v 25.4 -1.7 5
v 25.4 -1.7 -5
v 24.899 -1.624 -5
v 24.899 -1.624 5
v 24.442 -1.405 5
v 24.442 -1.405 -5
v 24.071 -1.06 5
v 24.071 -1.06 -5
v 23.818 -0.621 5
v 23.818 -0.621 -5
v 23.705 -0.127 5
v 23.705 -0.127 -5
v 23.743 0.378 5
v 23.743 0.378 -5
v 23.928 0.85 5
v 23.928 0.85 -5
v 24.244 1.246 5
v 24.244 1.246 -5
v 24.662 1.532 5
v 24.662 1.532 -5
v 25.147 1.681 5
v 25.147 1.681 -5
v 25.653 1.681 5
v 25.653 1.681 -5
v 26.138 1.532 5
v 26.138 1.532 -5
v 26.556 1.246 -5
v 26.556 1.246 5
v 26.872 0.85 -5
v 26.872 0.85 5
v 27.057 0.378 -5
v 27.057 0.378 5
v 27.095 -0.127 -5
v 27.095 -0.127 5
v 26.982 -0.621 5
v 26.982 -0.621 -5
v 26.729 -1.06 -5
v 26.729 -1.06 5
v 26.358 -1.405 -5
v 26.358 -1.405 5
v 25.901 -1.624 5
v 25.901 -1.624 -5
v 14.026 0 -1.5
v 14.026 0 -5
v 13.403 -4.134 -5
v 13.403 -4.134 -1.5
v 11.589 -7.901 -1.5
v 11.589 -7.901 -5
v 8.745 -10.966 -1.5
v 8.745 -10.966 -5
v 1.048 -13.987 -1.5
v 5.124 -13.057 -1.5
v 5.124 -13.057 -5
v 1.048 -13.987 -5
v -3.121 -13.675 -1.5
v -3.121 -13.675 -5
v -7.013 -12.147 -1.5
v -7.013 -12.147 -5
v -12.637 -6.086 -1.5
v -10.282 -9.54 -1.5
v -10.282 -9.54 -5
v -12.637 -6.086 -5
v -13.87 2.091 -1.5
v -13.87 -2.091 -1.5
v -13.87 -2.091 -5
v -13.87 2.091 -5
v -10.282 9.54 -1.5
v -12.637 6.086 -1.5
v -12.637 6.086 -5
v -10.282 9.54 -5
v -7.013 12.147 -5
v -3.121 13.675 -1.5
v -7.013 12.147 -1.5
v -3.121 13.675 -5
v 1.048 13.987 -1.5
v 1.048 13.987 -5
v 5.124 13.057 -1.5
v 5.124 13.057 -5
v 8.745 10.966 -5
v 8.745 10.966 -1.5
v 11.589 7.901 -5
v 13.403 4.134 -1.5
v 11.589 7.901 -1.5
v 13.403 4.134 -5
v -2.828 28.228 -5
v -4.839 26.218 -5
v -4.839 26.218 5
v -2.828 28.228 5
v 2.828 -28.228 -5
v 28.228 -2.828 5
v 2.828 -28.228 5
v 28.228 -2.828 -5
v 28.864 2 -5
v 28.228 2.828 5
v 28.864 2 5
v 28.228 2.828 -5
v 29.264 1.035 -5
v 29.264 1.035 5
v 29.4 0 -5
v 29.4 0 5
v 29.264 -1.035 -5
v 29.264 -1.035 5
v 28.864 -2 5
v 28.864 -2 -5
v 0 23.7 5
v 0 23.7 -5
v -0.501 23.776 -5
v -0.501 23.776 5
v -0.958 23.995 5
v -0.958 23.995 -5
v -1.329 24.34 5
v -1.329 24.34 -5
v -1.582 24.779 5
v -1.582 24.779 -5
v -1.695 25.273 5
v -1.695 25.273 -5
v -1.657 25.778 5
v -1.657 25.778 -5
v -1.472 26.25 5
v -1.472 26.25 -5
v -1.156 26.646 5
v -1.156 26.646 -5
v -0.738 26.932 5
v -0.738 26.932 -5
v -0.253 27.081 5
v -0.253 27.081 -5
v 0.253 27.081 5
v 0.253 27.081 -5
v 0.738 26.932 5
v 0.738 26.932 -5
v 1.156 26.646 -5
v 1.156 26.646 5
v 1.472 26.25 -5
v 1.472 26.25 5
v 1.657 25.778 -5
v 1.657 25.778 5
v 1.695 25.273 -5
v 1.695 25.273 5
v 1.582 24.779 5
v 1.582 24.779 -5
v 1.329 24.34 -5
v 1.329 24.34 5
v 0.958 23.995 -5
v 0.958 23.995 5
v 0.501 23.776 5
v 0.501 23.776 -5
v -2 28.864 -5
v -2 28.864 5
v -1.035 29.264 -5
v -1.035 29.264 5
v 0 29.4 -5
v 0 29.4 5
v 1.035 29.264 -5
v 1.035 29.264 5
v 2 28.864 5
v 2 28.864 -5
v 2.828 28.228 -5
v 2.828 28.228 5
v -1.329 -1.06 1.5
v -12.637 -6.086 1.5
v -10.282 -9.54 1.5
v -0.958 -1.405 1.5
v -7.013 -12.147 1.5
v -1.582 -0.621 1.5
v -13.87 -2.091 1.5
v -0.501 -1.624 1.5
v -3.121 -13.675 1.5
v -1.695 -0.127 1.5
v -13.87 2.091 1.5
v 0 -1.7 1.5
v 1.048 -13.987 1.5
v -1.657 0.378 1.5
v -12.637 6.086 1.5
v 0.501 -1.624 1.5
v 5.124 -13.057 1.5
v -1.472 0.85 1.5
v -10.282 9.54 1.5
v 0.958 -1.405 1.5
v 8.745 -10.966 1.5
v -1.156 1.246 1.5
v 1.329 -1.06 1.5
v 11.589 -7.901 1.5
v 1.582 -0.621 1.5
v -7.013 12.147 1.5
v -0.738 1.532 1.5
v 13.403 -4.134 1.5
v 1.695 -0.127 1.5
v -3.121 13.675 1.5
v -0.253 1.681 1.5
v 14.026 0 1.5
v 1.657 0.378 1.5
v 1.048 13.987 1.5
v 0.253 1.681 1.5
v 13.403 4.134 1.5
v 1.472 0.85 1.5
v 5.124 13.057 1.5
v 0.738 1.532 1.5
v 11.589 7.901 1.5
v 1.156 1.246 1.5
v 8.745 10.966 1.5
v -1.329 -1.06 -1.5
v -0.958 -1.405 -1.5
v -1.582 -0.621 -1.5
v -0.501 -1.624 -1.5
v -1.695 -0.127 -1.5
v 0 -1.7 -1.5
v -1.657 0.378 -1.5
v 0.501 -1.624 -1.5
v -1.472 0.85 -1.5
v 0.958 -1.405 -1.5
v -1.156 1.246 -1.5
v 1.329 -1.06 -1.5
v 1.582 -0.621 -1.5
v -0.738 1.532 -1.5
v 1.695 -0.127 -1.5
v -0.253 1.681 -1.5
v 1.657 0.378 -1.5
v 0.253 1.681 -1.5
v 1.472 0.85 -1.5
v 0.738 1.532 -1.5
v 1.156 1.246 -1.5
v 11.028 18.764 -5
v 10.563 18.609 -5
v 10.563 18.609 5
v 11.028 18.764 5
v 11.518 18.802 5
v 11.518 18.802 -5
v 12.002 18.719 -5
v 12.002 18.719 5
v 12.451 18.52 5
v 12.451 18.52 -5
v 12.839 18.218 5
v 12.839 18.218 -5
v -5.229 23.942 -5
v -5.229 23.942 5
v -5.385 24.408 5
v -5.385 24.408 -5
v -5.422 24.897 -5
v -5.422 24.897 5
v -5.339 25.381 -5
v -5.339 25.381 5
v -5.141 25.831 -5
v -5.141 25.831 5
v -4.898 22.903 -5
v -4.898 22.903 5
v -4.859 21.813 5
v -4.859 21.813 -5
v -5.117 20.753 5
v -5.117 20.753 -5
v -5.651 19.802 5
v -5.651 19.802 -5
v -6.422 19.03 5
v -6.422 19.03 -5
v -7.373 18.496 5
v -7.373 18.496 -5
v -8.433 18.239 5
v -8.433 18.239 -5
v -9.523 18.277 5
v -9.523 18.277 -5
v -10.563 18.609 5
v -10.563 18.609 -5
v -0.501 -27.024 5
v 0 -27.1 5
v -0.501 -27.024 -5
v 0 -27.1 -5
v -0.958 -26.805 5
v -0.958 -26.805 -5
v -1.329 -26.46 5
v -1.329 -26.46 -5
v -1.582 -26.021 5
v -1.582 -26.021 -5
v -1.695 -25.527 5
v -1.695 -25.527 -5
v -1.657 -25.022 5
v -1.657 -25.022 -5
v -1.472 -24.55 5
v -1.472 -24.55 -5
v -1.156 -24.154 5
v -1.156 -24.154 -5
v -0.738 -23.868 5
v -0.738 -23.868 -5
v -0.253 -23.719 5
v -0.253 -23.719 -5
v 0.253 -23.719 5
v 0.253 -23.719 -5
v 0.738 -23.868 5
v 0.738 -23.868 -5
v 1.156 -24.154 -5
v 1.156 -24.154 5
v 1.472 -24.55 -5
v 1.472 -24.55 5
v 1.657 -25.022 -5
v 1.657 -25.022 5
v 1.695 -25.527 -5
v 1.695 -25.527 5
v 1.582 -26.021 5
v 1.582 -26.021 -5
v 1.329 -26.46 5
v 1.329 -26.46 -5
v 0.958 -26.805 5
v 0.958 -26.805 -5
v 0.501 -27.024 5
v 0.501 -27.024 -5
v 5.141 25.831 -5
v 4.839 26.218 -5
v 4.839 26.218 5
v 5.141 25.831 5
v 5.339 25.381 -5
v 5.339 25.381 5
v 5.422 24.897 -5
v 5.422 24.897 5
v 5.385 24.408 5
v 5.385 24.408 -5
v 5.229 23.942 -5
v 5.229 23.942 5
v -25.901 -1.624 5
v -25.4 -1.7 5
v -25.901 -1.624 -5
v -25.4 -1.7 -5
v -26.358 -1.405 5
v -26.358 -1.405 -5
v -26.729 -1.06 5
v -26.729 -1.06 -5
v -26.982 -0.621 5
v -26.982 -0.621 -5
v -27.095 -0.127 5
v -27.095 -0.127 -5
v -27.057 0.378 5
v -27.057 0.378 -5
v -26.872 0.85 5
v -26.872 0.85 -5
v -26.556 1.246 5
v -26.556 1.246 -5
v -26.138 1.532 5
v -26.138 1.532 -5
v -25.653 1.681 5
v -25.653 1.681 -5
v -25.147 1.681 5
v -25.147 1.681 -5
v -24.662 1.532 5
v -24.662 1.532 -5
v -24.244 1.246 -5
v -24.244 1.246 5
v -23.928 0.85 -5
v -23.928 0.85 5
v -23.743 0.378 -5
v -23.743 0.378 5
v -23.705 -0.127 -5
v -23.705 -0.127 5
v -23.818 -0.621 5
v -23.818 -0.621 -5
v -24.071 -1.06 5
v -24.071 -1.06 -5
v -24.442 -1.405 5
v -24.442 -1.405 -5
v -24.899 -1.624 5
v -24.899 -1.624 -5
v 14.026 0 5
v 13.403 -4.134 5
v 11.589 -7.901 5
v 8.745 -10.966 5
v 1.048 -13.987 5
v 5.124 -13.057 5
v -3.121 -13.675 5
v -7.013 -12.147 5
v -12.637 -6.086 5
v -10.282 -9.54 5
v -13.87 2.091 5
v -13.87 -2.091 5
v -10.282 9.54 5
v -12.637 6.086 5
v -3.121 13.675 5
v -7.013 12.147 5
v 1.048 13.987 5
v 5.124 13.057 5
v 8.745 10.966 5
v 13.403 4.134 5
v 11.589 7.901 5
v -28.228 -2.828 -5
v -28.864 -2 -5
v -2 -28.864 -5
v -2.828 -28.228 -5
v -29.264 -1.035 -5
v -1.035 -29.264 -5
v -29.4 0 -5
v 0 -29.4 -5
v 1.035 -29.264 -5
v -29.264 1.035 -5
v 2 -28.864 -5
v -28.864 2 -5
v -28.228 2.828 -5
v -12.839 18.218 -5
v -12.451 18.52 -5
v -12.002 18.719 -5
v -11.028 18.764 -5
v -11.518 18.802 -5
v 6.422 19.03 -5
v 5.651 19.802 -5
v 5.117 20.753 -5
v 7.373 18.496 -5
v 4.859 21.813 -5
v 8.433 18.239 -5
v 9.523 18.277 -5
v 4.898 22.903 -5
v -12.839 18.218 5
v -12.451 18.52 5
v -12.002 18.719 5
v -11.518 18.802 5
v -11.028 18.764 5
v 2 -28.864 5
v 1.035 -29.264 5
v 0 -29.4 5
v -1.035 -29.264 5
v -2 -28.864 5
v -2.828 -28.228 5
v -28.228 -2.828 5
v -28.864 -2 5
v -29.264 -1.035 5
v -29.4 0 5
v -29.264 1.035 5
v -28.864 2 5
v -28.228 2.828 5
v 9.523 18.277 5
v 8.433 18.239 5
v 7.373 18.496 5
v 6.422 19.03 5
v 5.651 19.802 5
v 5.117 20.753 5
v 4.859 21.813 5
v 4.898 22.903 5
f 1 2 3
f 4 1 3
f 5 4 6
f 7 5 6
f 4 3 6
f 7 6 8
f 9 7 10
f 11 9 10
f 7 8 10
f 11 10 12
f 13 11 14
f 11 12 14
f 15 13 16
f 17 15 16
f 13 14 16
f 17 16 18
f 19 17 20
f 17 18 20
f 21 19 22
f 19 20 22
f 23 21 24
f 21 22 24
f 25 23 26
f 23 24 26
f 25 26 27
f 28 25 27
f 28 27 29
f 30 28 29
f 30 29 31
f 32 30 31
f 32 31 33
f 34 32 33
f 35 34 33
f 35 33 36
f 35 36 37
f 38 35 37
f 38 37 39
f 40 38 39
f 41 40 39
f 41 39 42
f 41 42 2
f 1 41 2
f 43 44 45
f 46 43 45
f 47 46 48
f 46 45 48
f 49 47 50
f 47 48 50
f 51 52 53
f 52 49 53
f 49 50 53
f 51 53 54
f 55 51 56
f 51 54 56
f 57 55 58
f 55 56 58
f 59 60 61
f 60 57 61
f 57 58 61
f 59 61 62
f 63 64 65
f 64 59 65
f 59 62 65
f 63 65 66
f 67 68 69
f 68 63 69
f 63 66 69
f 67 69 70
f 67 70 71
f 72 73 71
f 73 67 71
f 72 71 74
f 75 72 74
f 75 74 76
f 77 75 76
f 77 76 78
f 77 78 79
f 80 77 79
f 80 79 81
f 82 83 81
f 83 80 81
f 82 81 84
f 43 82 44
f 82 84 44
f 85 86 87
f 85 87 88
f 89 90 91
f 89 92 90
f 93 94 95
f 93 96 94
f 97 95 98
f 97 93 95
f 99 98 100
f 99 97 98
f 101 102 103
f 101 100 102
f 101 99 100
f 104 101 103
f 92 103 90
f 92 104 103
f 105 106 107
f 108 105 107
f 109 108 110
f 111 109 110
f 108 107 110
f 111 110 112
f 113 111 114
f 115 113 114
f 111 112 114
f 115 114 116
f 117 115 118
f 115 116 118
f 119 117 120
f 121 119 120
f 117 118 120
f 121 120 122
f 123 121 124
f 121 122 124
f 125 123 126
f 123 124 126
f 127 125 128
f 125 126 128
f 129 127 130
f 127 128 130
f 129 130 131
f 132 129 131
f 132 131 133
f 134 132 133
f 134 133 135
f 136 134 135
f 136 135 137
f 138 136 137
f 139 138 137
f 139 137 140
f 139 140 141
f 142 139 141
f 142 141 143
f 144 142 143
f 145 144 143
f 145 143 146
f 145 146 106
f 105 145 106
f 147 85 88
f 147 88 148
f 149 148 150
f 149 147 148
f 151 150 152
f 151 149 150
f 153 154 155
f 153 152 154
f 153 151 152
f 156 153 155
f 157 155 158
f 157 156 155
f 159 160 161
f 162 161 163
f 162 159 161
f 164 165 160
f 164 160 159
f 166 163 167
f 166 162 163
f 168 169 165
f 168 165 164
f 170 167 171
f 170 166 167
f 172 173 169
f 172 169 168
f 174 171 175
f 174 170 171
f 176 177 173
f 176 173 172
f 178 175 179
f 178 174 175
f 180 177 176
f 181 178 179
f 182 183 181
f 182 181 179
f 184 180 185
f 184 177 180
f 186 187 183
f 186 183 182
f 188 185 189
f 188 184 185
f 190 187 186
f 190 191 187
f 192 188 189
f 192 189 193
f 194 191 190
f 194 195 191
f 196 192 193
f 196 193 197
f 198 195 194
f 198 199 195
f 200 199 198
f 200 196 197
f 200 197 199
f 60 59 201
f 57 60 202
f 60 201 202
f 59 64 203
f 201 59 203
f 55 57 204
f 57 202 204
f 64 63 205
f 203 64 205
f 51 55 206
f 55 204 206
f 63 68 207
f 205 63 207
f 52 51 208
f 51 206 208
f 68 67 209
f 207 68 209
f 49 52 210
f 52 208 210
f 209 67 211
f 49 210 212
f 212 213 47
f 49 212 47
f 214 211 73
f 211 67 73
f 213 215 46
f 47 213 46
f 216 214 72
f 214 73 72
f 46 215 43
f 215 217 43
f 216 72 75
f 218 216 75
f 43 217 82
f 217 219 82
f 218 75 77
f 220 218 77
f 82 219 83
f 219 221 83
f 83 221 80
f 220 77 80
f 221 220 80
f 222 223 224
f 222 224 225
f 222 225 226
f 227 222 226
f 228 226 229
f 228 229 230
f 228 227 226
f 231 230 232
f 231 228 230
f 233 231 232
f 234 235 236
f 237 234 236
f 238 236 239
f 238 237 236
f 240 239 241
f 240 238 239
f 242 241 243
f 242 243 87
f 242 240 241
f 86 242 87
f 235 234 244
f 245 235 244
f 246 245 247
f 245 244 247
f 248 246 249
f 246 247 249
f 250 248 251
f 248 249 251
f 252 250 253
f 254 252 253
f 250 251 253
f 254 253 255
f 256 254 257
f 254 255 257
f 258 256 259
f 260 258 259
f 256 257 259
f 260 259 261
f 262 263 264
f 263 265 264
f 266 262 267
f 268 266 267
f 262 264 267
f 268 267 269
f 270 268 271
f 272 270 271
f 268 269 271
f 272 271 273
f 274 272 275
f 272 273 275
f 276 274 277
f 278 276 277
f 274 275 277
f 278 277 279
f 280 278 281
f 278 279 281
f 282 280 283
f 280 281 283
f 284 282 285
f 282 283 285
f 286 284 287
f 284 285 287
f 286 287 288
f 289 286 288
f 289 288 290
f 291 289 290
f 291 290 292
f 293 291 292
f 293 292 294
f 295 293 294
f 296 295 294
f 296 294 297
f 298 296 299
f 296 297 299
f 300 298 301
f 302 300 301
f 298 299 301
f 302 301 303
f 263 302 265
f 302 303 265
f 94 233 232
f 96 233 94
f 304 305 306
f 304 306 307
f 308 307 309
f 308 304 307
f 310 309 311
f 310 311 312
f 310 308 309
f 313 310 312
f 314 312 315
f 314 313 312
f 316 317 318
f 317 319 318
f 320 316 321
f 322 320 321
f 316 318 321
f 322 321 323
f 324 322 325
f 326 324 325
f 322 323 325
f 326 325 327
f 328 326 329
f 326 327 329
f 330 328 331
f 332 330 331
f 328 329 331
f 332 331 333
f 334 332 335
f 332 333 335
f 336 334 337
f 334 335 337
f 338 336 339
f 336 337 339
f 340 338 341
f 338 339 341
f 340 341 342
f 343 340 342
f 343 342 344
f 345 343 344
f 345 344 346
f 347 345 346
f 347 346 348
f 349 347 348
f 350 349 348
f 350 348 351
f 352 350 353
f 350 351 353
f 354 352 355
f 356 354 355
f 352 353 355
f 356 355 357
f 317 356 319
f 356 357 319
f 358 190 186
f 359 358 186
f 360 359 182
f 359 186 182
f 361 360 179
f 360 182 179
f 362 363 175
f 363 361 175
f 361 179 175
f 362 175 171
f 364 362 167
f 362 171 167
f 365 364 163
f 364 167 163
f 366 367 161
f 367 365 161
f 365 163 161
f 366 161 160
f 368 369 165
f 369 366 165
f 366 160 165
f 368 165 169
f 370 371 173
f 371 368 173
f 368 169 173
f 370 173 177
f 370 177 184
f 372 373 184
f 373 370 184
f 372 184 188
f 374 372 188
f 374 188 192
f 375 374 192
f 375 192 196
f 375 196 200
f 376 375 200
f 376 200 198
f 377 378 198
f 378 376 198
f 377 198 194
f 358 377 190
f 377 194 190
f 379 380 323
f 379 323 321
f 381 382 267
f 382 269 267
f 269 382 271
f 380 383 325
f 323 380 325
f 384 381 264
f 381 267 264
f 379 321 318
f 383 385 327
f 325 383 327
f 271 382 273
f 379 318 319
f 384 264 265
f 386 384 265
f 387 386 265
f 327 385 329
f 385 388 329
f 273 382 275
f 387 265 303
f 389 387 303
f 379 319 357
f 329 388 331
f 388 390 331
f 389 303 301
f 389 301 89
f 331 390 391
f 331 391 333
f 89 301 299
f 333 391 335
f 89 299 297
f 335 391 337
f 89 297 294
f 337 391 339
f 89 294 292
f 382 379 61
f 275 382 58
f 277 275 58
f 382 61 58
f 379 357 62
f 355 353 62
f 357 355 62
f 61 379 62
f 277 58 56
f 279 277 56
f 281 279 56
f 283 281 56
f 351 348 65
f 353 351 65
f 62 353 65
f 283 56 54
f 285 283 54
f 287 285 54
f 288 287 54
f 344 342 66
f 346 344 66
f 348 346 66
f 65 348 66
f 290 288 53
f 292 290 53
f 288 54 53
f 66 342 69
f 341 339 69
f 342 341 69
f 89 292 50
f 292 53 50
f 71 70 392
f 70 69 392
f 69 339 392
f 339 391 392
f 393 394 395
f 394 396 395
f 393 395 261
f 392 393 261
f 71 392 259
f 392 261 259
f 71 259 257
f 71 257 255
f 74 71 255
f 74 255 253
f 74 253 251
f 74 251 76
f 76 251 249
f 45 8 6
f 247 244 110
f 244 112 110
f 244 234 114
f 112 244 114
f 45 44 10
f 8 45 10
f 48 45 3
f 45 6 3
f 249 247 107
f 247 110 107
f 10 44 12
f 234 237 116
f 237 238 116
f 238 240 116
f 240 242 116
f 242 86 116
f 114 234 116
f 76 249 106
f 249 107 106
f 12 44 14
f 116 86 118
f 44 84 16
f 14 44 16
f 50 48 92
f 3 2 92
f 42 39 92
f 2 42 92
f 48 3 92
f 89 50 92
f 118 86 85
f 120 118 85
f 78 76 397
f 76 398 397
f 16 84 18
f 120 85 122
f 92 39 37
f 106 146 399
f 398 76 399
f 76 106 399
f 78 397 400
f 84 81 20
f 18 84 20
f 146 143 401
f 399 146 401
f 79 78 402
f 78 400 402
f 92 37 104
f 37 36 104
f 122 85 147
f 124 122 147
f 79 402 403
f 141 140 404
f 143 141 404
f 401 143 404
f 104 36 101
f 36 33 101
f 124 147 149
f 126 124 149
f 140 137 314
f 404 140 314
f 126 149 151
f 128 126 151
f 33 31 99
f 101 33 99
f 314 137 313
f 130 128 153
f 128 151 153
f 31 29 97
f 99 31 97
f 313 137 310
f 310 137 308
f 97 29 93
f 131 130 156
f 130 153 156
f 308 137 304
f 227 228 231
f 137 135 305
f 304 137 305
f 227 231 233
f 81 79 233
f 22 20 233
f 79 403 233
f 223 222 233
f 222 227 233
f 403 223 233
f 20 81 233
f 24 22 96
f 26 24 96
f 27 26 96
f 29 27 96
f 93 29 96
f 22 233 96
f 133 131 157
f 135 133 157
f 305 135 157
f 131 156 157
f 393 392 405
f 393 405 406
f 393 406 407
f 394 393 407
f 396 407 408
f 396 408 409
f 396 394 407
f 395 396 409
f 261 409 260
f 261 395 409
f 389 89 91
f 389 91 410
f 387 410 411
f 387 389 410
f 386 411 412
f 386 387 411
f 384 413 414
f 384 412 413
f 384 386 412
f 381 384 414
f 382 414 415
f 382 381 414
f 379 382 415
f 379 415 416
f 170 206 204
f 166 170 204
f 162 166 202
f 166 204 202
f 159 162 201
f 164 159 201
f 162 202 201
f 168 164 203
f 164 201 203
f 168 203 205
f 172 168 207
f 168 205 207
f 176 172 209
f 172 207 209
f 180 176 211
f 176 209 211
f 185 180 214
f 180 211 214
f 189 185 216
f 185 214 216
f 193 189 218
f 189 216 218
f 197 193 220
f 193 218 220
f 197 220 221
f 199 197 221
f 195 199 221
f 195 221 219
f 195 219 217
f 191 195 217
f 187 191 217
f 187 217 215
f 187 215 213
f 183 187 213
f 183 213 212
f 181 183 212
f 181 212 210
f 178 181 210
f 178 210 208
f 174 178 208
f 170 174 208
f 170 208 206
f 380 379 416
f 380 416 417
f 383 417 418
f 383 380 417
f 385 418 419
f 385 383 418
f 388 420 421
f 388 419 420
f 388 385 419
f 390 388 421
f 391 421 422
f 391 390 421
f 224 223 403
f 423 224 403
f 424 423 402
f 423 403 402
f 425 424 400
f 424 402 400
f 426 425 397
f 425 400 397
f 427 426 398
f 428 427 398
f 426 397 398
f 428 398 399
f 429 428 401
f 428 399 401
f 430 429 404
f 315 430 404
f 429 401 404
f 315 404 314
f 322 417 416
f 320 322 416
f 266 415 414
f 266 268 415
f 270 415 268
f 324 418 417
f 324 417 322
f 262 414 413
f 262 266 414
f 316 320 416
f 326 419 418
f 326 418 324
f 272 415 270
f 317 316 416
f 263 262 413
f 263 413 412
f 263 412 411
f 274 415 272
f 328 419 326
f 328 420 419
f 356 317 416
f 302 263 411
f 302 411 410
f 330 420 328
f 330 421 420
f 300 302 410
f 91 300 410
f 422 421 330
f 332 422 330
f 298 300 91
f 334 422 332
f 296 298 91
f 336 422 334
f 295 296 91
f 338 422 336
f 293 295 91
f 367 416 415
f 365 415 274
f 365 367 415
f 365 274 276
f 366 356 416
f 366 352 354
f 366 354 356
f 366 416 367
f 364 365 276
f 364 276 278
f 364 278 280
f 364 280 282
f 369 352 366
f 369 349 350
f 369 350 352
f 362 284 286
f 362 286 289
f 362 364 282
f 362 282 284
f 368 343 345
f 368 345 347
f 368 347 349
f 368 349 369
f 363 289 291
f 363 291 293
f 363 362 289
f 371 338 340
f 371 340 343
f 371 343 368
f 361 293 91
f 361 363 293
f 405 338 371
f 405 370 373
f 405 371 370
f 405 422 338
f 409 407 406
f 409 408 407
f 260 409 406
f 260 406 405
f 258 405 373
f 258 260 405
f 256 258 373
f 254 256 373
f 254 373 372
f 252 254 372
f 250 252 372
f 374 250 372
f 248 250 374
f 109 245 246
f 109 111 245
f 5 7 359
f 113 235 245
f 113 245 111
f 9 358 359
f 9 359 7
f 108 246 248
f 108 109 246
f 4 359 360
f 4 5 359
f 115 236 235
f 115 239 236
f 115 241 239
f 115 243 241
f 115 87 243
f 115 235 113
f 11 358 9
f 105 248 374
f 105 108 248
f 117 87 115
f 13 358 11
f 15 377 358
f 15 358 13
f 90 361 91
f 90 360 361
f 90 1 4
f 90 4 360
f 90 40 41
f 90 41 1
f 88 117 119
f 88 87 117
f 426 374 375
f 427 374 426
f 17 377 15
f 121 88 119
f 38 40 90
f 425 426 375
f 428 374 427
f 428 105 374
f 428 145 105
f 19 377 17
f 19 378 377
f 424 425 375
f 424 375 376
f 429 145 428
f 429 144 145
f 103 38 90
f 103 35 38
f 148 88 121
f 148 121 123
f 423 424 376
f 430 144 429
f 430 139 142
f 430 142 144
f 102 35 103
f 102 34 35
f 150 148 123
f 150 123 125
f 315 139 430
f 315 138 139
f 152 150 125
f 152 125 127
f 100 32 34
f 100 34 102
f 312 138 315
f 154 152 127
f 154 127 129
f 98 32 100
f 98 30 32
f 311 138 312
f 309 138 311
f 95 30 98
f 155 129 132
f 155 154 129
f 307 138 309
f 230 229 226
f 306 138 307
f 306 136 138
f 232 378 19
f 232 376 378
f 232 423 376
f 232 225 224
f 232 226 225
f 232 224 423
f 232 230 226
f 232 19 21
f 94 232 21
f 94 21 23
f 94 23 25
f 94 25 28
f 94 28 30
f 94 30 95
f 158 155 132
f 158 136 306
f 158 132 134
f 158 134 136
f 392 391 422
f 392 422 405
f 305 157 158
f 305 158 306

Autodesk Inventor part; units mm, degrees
ref_plane "YZ Plane" through (0, 0, 0) normal (1, 0, 0) x (0, 1, 0)
ref_plane "XZ Plane" through (0, 0, 0) normal (0, 1, 0) x (-1, 0, 0)
ref_plane "XY Plane" through (0, 0, 0) normal (0, 0, 1) x (1, 0, 0)
sketch "Sketch1" plane through (0, 0, 0) normal (0, 0, 1) x (1, 0, 0)
  line L0 (0, 25.4) -> (-25.4, 0) construction
  line L1 (-25.4, 0) -> (0, -25.4) construction
  line L2 (0, -25.4) -> (25.4, 0) construction
  line L3 (25.4, 0) -> (0, 25.4) construction
  line L4 (0, 25.4) -> (0, -25.4) construction
  line L5 (-25.4, 0) -> (25.4, 0) construction
  line L6 (-28.2284, 2.8284) -> (-2.8284, 28.2284)
  line L7 (2.8284, 28.2284) -> (28.2284, 2.8284)
  line L8 (28.2284, -2.8284) -> (2.8284, -28.2284)
  line L9 (-2.8284, -28.2284) -> (-28.2284, -2.8284)
  arc A0 (2.8284, 28.2284) -> (-2.8284, 28.2284) centre (0, 25.4) ccw
  arc A1 (28.2284, -2.8284) -> (28.2284, 2.8284) centre (25.4, 0) ccw
  arc A2 (-2.8284, -28.2284) -> (2.8284, -28.2284) centre (0, -25.4) ccw
  arc A3 (-28.2284, 2.8284) -> (-28.2284, -2.8284) centre (-25.4, 0) ccw
  circle A4 centre (0, 0) radius 10.0263 construction
  circle A5 centre (0, 0) radius 14.0263
  dimension "d0" = 4
  dimension "d1" = 4
  dimension "d2" = 25.4
  dimension "d22" = 20.0526
  dimension "d23" = 4
extrude "Extrusion1" add sketch "Sketch1" along normal mid plane 10
extrude "Extrusion2" add sketch "Sketch1" along normal mid plane 3 contours A5
sketch "Sketch2" plane through (0, 0, 5) normal (0, 0, 1) x (1, 0, 0)
  arc A0 (28.2284, -2.8284) -> (28.2284, 2.8284) centre (25.4, 0) ccw projected
  arc A1 (2.8284, 28.2284) -> (-2.8284, 28.2284) centre (0, 25.4) ccw projected
  arc A2 (-28.2284, 2.8284) -> (-28.2284, -2.8284) centre (-25.4, 0) ccw projected
  arc A3 (-2.8284, -28.2284) -> (2.8284, -28.2284) centre (0, -25.4) ccw projected
  point P0 (0, 0)
hole "Hole1" at (0, 25.4, 5) at (-25.4, 0, 5) at (0, -25.4, 5) at (25.4, 0, 5) at (0, 0, 5) direction (0, 0, -1) diameter 3.4 end through all clearance for "Socket Head Cap Screw" size "M3" standard "Ansi Metric M Profile"
sketch "Sketch3" plane through (0, 0, -5) normal (0, 0, -1) x (-1, 0, 0)
  circle A0 centre (0, 0) radius 14.0263 construction
  arc A1 (2.8284, 28.2284) -> (-2.8284, 28.2284) centre (0, 25.4) ccw construction
  line L0 (-28.2284, 2.8284) -> (-2.8284, 28.2284) construction
  circle A2 centre (-8.8388, 22.218) radius 4
  line L1 (0, 0) -> (0, 25.4) construction
  circle A3 centre (8.8388, 22.218) radius 4
  dimension "d26" = 8.5
  dimension "d27" = 8
extrude "Extrusion3" cut sketch "Sketch3" against normal through all
fillet "Fillet1" radius 2 4 edges at (6.0104, 25.0464, 0) (11.6673, 19.3896, 0) (-6.0104, 25.0464, 0) (-11.6673, 19.3896, 0)
equation "\"d2\" = LengthA"
equation "\"d22\" = 2 * LengthM"
equation "\"LengthM\" = 10.02632"
equation "\"LengthA\" = 25.4"
properties part number "MatingPlates"
